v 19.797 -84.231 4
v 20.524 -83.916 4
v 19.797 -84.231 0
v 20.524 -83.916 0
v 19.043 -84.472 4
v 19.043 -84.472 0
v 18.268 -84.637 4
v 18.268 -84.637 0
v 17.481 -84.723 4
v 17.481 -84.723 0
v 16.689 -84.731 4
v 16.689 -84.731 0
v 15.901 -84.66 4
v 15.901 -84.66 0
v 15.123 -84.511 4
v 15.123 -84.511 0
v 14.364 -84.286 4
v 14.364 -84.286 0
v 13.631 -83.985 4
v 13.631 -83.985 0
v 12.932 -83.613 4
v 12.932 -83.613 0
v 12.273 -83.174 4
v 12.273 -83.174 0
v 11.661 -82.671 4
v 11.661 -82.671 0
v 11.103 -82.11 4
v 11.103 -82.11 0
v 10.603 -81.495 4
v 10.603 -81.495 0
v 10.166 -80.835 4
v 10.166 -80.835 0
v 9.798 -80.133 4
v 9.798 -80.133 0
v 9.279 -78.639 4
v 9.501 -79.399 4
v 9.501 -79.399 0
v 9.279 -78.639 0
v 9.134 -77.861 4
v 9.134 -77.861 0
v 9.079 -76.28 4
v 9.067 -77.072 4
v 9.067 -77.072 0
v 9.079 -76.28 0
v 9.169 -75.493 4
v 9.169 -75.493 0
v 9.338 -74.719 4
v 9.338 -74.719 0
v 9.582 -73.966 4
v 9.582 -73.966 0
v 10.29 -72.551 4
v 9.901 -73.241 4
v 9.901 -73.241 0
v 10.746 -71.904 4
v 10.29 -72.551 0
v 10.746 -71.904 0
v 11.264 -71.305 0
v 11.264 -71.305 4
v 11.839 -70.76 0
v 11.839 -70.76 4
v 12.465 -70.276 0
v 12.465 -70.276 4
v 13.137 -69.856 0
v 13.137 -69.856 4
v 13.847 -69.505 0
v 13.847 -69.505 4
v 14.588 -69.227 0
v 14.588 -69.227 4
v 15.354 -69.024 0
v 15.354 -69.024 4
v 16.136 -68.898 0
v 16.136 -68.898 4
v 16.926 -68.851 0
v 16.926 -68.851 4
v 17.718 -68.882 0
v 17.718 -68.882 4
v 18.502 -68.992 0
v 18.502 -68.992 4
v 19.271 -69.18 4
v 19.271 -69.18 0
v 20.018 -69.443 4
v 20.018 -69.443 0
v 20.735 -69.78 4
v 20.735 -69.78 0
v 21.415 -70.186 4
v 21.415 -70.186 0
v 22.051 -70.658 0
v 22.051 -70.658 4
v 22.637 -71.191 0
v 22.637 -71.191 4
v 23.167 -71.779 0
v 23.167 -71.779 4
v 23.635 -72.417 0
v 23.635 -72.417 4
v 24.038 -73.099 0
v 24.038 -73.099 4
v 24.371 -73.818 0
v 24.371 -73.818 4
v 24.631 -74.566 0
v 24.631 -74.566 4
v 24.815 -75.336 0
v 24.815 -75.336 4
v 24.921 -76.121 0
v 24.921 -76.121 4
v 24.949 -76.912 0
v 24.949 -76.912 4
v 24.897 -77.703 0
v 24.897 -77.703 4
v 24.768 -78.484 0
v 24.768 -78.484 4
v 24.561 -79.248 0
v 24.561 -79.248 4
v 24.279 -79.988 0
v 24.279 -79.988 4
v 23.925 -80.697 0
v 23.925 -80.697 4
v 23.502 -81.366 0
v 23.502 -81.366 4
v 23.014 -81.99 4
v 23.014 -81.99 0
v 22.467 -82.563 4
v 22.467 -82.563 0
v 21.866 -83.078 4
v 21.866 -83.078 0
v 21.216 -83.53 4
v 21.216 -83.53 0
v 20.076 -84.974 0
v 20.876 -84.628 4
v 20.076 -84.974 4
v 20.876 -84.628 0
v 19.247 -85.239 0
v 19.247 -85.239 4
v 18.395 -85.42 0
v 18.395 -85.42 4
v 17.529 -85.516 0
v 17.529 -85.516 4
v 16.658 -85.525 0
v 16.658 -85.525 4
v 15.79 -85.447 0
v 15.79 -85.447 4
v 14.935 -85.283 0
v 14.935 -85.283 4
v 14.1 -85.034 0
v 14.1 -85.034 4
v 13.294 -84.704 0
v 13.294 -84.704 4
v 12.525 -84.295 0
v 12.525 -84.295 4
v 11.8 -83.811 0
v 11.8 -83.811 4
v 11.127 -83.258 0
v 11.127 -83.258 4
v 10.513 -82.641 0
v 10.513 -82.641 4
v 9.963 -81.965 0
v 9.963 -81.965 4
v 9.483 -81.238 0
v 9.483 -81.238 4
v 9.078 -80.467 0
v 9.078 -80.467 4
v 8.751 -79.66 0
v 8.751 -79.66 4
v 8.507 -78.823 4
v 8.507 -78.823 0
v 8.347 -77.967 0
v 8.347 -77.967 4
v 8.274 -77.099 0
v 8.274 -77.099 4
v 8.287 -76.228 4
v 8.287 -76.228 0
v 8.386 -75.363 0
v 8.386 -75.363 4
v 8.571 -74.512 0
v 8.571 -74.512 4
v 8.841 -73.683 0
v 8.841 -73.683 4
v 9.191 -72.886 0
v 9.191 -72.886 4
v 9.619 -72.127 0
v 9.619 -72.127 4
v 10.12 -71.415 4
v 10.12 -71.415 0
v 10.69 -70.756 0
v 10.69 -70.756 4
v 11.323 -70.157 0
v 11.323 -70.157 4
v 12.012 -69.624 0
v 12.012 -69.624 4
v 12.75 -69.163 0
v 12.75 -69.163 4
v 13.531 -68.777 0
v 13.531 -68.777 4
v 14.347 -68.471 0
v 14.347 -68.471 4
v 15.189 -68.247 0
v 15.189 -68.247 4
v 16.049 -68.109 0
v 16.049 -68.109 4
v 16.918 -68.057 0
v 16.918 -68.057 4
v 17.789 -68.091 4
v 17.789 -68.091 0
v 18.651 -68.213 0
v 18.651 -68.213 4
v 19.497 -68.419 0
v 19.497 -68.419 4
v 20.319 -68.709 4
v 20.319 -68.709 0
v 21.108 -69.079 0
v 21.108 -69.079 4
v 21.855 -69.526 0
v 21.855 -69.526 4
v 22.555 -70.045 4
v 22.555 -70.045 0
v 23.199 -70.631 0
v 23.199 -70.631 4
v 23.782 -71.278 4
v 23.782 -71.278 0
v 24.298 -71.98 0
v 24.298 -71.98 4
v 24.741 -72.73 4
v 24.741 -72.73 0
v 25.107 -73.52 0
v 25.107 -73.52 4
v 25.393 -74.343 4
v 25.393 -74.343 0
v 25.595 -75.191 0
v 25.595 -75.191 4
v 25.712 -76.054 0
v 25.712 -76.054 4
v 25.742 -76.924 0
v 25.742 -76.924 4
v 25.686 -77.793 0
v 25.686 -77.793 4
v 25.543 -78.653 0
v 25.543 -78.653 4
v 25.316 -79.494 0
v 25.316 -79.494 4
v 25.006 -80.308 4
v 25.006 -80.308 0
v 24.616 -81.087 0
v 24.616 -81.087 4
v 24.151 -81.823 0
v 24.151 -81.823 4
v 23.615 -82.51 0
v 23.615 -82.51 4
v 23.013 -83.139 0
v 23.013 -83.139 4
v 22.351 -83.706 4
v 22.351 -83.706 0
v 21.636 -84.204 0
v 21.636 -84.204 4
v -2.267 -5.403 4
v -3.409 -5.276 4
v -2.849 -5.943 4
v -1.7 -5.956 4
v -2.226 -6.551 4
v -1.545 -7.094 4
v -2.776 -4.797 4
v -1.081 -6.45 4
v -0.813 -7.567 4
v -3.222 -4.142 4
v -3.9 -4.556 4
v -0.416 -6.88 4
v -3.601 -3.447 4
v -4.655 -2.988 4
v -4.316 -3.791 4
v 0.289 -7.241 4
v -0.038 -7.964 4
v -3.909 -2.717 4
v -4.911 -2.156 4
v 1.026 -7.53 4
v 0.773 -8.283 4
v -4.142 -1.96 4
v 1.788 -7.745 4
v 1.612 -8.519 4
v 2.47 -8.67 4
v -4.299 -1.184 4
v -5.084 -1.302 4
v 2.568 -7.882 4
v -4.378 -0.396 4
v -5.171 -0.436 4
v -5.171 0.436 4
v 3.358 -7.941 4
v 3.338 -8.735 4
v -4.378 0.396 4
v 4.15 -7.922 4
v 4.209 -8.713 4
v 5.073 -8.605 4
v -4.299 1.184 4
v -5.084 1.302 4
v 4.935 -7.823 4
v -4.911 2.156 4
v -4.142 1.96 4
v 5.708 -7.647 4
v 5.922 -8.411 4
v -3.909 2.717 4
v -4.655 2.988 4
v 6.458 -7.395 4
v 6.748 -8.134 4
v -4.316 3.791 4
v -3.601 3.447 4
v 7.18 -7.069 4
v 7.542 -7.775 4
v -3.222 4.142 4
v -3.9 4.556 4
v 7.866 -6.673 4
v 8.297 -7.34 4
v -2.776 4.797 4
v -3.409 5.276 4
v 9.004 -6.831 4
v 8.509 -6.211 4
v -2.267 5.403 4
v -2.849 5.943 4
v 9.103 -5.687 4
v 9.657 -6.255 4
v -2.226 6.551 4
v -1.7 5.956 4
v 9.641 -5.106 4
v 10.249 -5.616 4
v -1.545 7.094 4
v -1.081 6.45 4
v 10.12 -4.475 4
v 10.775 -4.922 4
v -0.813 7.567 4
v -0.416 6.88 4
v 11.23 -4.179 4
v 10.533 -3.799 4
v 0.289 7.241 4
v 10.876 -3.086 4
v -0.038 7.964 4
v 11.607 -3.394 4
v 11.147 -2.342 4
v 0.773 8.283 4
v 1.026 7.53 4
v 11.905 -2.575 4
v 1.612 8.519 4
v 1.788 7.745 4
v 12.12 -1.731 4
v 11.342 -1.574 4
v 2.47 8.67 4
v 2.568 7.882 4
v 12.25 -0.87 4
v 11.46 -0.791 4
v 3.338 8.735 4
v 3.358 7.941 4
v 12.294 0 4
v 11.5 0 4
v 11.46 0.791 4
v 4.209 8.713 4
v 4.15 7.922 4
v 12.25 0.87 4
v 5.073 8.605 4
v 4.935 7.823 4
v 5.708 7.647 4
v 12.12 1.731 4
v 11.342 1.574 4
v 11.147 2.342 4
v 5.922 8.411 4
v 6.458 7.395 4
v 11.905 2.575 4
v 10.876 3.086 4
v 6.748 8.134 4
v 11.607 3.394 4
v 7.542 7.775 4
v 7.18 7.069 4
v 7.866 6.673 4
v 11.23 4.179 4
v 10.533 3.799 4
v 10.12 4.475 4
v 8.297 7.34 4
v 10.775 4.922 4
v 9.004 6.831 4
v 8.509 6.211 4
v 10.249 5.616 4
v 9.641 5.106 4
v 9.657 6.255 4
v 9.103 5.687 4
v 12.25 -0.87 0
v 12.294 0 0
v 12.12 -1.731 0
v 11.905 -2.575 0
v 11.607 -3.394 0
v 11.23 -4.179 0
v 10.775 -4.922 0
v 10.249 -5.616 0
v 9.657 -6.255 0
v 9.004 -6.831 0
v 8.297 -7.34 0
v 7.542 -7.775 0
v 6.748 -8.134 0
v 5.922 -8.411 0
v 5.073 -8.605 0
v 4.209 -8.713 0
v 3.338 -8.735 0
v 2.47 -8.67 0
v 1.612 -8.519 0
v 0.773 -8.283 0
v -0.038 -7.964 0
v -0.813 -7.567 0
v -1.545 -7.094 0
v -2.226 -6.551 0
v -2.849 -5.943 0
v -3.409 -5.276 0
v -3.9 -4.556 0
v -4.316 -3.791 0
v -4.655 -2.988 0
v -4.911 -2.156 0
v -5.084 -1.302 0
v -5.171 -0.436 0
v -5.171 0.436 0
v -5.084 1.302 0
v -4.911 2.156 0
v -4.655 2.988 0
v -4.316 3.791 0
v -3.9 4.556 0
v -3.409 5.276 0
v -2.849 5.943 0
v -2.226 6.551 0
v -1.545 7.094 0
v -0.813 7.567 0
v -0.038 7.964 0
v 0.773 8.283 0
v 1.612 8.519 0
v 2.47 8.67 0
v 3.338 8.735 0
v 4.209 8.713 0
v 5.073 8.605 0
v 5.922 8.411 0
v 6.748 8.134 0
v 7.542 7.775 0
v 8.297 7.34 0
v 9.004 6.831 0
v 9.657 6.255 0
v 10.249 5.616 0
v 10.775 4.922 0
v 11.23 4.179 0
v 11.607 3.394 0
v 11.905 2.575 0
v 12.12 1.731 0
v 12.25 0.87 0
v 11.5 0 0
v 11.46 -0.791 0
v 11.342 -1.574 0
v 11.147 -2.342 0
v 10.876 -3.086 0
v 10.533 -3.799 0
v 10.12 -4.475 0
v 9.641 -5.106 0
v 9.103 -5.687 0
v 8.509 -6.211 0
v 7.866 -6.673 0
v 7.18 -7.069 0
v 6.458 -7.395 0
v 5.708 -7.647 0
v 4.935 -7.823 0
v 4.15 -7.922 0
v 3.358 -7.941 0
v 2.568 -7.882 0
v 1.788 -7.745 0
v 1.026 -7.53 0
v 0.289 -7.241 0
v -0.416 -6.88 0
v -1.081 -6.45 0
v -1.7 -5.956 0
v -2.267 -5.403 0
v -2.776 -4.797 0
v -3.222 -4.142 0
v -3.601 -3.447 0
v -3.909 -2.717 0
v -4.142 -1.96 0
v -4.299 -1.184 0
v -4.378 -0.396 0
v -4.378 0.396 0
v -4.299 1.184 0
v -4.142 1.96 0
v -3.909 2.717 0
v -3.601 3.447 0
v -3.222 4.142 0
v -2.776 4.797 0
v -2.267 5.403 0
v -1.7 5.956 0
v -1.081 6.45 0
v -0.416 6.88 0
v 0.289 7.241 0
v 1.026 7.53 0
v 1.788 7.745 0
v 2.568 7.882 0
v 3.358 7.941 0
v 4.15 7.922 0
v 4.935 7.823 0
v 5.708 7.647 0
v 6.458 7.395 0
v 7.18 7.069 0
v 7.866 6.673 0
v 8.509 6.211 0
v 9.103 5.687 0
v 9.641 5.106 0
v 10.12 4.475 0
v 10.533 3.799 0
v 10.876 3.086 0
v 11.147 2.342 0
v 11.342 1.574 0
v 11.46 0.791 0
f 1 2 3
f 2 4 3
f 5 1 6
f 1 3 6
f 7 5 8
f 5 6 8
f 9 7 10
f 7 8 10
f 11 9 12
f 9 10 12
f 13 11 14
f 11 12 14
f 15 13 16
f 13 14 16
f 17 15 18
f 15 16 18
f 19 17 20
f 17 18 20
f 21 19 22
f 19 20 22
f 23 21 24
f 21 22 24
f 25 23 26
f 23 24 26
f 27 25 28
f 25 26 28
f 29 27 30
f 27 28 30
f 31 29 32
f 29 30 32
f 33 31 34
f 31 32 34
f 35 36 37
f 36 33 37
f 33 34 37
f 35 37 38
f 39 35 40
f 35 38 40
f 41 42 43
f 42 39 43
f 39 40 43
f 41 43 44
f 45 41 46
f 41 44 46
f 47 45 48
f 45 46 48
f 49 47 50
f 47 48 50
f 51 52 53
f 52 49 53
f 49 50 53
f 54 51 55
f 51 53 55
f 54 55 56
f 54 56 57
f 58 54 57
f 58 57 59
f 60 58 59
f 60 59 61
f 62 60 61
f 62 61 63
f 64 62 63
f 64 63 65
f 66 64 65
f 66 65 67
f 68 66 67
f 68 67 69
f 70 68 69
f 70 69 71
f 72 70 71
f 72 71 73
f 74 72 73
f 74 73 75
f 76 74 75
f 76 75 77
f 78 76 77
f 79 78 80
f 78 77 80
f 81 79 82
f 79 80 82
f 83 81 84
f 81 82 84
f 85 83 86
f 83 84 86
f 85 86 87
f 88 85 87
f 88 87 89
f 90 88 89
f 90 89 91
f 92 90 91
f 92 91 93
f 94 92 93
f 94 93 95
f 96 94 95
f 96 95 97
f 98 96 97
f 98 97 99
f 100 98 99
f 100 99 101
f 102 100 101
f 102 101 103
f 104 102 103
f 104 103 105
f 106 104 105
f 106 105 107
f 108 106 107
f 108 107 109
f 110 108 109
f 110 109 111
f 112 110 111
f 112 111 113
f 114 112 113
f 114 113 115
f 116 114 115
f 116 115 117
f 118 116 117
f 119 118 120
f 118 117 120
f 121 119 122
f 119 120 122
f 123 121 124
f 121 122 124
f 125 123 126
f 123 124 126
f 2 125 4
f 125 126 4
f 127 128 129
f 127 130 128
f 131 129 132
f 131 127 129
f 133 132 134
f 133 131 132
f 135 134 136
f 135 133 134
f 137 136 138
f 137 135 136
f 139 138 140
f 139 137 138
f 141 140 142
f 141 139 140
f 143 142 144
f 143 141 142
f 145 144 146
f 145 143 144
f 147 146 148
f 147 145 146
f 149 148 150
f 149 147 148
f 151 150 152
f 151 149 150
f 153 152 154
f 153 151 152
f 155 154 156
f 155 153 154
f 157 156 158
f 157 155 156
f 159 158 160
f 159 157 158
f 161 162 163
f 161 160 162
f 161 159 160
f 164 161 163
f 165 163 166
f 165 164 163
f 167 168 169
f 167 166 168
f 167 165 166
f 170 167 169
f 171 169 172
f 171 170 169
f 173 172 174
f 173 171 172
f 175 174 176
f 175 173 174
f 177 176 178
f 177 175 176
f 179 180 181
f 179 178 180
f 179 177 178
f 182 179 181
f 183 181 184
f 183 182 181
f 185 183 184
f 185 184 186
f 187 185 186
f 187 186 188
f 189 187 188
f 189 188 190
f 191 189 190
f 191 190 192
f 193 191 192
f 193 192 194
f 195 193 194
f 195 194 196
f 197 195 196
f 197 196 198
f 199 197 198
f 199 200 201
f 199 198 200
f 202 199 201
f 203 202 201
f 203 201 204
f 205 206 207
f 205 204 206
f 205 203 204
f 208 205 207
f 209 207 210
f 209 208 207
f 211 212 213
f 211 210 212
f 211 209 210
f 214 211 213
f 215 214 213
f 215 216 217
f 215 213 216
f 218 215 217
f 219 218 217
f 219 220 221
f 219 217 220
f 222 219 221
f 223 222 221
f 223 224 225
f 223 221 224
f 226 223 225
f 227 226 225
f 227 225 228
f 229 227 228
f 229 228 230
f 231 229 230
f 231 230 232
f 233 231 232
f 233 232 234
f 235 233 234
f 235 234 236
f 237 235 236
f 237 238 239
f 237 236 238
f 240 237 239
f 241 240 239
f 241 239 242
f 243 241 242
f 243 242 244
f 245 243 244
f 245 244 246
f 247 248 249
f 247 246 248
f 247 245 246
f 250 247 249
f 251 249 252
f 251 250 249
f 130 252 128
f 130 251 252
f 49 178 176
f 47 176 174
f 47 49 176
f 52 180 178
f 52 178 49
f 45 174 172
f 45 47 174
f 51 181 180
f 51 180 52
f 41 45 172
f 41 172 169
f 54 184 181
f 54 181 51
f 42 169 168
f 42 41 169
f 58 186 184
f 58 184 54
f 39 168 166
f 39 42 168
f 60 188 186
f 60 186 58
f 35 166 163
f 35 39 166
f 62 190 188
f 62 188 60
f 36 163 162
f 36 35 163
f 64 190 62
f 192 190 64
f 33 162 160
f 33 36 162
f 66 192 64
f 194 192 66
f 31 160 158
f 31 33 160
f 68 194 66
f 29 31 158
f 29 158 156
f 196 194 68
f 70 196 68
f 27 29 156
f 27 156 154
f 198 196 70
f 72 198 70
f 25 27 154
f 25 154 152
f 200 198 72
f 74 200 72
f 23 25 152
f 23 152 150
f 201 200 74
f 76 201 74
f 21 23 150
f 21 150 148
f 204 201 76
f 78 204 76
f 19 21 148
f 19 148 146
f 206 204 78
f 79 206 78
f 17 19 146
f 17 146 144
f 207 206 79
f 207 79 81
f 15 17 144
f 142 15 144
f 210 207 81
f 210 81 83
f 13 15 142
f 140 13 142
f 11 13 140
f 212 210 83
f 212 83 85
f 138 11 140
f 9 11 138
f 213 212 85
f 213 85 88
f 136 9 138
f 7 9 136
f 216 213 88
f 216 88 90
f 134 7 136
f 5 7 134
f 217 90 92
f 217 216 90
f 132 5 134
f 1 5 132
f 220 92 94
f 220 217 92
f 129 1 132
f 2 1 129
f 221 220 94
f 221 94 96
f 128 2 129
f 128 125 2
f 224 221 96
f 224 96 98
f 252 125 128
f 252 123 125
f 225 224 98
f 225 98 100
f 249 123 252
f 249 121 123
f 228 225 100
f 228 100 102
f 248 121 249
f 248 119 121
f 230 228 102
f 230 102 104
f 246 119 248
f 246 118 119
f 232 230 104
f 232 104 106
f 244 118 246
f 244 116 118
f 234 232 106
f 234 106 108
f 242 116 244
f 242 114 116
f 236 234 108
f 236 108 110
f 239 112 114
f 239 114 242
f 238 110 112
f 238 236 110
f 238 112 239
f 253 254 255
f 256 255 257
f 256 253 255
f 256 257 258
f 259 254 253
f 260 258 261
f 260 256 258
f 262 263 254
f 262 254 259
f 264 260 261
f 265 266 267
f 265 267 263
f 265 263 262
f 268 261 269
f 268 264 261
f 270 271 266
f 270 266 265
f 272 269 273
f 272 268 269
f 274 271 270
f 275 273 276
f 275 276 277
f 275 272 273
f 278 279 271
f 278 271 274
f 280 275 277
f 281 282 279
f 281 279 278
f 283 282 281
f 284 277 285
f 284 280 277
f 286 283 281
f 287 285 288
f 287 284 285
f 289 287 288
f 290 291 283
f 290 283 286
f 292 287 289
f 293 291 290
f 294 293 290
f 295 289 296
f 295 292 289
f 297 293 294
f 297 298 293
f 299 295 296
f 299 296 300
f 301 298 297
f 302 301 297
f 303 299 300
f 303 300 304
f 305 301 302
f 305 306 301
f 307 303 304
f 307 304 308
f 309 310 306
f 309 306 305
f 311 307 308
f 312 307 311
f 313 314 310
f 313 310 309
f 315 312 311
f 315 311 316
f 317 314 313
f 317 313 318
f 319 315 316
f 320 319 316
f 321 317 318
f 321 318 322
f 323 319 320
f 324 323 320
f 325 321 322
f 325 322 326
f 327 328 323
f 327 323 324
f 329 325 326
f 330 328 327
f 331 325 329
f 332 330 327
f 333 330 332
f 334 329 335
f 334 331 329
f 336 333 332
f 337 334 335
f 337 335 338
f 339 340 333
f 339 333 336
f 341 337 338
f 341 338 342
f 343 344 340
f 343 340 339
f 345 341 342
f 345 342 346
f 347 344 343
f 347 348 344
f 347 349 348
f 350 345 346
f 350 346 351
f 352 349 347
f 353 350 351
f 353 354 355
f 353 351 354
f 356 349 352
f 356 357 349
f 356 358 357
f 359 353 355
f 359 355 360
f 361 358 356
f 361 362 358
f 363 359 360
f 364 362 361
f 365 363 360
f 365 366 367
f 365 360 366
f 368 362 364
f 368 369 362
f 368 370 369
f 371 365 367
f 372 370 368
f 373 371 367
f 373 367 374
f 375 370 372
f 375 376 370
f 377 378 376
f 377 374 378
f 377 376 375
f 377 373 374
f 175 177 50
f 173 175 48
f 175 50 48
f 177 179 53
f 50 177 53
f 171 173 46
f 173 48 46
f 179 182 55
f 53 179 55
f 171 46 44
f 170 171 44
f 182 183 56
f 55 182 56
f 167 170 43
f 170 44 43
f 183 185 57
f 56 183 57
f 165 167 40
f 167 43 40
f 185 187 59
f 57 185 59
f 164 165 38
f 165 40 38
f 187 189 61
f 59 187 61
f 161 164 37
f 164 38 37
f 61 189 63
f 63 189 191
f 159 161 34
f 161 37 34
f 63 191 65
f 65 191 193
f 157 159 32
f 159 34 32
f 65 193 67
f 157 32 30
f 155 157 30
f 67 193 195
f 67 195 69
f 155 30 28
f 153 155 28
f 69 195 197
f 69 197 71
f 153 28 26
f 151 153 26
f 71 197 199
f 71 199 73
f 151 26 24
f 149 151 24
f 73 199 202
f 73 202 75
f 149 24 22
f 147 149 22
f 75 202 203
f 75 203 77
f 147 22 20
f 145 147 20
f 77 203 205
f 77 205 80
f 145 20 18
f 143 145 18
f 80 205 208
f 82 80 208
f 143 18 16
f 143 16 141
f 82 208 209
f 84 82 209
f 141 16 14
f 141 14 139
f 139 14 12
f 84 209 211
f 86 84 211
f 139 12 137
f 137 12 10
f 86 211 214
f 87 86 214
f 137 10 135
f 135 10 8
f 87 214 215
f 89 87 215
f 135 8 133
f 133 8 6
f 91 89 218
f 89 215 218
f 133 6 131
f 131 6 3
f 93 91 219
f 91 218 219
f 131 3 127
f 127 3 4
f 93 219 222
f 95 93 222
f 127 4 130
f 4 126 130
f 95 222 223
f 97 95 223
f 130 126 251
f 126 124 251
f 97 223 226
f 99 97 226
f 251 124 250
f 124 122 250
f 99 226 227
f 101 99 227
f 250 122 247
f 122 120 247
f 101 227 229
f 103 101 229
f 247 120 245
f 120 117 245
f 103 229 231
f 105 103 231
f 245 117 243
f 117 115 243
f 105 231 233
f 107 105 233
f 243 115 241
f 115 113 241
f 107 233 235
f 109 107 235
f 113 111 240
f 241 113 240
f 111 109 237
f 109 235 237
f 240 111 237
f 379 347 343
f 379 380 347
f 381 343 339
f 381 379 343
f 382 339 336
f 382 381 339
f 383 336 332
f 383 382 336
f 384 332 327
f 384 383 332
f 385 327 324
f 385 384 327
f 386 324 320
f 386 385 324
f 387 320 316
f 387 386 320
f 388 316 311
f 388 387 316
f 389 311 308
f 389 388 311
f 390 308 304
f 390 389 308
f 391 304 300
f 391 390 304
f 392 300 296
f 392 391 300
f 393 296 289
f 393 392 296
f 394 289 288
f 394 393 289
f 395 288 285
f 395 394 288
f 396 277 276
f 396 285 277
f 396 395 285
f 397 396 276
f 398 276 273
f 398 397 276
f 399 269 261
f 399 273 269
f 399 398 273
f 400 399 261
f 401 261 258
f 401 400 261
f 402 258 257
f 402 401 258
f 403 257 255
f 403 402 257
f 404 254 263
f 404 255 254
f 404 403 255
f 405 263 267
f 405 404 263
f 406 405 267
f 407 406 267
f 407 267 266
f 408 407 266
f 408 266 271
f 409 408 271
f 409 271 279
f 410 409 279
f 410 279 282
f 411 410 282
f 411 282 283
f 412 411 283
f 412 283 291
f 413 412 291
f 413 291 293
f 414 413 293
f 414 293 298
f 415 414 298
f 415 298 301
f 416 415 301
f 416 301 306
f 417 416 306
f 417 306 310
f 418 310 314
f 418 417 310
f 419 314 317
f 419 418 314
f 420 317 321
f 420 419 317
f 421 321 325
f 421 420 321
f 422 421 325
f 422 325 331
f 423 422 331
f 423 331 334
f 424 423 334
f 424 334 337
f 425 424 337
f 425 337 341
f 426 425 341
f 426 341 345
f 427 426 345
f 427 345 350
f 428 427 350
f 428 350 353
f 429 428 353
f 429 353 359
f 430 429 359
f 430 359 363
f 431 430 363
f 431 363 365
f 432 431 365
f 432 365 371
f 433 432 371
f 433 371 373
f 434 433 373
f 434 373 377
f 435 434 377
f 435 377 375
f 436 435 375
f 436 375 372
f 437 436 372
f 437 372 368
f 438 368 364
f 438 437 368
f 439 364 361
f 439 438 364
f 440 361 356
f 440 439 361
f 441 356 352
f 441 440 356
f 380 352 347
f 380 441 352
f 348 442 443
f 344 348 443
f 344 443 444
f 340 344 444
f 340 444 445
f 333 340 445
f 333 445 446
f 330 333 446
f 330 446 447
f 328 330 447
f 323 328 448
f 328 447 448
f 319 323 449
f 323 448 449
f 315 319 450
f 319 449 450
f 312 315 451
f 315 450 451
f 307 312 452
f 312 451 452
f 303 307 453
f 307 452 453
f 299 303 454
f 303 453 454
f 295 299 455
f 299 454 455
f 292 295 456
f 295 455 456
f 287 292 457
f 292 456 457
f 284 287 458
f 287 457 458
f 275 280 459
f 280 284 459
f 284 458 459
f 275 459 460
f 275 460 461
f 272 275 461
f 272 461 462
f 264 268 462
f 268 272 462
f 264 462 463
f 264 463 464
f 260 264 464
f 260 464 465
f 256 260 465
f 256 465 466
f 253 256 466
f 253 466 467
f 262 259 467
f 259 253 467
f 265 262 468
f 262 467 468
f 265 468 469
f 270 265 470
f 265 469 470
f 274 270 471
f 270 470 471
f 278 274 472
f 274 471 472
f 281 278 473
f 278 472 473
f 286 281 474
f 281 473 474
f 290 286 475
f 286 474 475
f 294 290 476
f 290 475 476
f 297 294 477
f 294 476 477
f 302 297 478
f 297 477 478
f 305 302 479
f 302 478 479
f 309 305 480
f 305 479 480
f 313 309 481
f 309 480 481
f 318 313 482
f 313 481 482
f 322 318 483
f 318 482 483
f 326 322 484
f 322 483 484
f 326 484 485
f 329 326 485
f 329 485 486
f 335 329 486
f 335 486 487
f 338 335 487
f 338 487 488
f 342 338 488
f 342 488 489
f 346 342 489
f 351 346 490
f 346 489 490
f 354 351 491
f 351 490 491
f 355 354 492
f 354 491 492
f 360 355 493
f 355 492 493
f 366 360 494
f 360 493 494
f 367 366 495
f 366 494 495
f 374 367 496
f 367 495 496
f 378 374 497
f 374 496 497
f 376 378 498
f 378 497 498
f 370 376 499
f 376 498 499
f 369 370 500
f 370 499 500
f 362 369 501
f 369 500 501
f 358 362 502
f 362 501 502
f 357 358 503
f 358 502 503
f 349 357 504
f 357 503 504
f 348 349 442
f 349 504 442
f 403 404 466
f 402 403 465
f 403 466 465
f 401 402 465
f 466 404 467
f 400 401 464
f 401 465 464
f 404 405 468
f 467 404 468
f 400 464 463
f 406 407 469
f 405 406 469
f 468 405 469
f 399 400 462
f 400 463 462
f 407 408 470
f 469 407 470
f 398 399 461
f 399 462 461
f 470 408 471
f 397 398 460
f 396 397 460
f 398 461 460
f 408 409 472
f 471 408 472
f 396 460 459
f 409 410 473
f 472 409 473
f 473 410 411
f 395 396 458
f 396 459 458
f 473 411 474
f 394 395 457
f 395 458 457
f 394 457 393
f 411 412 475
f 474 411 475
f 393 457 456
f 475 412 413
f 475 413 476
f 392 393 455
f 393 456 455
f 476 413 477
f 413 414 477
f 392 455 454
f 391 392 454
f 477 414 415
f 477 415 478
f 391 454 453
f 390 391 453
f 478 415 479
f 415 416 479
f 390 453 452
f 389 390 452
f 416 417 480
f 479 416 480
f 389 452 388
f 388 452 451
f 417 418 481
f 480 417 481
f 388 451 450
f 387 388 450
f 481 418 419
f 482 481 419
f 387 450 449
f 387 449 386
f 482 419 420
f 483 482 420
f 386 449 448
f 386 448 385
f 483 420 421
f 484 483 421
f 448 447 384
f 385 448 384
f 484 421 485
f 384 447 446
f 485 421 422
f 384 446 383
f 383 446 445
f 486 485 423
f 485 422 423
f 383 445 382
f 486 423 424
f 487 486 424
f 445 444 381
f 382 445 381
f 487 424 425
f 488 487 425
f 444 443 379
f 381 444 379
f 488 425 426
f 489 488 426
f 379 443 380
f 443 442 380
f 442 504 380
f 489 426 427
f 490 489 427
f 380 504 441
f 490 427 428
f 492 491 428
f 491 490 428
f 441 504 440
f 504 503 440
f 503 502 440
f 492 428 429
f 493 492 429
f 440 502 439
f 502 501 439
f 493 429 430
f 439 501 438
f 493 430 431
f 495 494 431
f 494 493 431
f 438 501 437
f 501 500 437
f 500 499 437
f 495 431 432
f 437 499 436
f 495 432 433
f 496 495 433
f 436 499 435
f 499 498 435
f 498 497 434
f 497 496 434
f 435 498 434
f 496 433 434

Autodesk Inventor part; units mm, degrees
ref_plane "YZ Plane" through (0, 0, 0) normal (1, 0, 0) x (0, 1, 0)
ref_plane "XZ Plane" through (0, 0, 0) normal (0, 1, 0) x (-1, 0, 0)
ref_plane "XY Plane" through (0, 0, 0) normal (0, 0, 1) x (1, 0, 0)
sketch "Sketch1" plane through (0, 0, 0) normal (0, 0, 1) x (1, 0, 0)
  circle A0 centre (3.556, 0) radius 8.7376 projected
  circle A1 centre (3.556, 0) radius 7.9439 projected
  point P0 (0, 0)
extrude "Extrusion1" add sketch "Sketch1" along normal blind 4
ref_plane "Work Plane1" through (15.4309, -73.6057, 0) normal (0, 0, 1) x (0.4429, -0.8966, 0)
sketch "Sketch2" plane through (15.4309, -73.6057, 0) normal (0, 0, 1) x (0.4429, -0.8966, 0)
  circle A0 centre (3.556, 0) radius 8.7376 projected
  circle A1 centre (3.556, 0) radius 7.9438 projected
  point P0 (-72.8269, 18.7655)
extrude "Extrusion2" add sketch "Sketch2" along normal blind 4
properties part number "washer connector"
